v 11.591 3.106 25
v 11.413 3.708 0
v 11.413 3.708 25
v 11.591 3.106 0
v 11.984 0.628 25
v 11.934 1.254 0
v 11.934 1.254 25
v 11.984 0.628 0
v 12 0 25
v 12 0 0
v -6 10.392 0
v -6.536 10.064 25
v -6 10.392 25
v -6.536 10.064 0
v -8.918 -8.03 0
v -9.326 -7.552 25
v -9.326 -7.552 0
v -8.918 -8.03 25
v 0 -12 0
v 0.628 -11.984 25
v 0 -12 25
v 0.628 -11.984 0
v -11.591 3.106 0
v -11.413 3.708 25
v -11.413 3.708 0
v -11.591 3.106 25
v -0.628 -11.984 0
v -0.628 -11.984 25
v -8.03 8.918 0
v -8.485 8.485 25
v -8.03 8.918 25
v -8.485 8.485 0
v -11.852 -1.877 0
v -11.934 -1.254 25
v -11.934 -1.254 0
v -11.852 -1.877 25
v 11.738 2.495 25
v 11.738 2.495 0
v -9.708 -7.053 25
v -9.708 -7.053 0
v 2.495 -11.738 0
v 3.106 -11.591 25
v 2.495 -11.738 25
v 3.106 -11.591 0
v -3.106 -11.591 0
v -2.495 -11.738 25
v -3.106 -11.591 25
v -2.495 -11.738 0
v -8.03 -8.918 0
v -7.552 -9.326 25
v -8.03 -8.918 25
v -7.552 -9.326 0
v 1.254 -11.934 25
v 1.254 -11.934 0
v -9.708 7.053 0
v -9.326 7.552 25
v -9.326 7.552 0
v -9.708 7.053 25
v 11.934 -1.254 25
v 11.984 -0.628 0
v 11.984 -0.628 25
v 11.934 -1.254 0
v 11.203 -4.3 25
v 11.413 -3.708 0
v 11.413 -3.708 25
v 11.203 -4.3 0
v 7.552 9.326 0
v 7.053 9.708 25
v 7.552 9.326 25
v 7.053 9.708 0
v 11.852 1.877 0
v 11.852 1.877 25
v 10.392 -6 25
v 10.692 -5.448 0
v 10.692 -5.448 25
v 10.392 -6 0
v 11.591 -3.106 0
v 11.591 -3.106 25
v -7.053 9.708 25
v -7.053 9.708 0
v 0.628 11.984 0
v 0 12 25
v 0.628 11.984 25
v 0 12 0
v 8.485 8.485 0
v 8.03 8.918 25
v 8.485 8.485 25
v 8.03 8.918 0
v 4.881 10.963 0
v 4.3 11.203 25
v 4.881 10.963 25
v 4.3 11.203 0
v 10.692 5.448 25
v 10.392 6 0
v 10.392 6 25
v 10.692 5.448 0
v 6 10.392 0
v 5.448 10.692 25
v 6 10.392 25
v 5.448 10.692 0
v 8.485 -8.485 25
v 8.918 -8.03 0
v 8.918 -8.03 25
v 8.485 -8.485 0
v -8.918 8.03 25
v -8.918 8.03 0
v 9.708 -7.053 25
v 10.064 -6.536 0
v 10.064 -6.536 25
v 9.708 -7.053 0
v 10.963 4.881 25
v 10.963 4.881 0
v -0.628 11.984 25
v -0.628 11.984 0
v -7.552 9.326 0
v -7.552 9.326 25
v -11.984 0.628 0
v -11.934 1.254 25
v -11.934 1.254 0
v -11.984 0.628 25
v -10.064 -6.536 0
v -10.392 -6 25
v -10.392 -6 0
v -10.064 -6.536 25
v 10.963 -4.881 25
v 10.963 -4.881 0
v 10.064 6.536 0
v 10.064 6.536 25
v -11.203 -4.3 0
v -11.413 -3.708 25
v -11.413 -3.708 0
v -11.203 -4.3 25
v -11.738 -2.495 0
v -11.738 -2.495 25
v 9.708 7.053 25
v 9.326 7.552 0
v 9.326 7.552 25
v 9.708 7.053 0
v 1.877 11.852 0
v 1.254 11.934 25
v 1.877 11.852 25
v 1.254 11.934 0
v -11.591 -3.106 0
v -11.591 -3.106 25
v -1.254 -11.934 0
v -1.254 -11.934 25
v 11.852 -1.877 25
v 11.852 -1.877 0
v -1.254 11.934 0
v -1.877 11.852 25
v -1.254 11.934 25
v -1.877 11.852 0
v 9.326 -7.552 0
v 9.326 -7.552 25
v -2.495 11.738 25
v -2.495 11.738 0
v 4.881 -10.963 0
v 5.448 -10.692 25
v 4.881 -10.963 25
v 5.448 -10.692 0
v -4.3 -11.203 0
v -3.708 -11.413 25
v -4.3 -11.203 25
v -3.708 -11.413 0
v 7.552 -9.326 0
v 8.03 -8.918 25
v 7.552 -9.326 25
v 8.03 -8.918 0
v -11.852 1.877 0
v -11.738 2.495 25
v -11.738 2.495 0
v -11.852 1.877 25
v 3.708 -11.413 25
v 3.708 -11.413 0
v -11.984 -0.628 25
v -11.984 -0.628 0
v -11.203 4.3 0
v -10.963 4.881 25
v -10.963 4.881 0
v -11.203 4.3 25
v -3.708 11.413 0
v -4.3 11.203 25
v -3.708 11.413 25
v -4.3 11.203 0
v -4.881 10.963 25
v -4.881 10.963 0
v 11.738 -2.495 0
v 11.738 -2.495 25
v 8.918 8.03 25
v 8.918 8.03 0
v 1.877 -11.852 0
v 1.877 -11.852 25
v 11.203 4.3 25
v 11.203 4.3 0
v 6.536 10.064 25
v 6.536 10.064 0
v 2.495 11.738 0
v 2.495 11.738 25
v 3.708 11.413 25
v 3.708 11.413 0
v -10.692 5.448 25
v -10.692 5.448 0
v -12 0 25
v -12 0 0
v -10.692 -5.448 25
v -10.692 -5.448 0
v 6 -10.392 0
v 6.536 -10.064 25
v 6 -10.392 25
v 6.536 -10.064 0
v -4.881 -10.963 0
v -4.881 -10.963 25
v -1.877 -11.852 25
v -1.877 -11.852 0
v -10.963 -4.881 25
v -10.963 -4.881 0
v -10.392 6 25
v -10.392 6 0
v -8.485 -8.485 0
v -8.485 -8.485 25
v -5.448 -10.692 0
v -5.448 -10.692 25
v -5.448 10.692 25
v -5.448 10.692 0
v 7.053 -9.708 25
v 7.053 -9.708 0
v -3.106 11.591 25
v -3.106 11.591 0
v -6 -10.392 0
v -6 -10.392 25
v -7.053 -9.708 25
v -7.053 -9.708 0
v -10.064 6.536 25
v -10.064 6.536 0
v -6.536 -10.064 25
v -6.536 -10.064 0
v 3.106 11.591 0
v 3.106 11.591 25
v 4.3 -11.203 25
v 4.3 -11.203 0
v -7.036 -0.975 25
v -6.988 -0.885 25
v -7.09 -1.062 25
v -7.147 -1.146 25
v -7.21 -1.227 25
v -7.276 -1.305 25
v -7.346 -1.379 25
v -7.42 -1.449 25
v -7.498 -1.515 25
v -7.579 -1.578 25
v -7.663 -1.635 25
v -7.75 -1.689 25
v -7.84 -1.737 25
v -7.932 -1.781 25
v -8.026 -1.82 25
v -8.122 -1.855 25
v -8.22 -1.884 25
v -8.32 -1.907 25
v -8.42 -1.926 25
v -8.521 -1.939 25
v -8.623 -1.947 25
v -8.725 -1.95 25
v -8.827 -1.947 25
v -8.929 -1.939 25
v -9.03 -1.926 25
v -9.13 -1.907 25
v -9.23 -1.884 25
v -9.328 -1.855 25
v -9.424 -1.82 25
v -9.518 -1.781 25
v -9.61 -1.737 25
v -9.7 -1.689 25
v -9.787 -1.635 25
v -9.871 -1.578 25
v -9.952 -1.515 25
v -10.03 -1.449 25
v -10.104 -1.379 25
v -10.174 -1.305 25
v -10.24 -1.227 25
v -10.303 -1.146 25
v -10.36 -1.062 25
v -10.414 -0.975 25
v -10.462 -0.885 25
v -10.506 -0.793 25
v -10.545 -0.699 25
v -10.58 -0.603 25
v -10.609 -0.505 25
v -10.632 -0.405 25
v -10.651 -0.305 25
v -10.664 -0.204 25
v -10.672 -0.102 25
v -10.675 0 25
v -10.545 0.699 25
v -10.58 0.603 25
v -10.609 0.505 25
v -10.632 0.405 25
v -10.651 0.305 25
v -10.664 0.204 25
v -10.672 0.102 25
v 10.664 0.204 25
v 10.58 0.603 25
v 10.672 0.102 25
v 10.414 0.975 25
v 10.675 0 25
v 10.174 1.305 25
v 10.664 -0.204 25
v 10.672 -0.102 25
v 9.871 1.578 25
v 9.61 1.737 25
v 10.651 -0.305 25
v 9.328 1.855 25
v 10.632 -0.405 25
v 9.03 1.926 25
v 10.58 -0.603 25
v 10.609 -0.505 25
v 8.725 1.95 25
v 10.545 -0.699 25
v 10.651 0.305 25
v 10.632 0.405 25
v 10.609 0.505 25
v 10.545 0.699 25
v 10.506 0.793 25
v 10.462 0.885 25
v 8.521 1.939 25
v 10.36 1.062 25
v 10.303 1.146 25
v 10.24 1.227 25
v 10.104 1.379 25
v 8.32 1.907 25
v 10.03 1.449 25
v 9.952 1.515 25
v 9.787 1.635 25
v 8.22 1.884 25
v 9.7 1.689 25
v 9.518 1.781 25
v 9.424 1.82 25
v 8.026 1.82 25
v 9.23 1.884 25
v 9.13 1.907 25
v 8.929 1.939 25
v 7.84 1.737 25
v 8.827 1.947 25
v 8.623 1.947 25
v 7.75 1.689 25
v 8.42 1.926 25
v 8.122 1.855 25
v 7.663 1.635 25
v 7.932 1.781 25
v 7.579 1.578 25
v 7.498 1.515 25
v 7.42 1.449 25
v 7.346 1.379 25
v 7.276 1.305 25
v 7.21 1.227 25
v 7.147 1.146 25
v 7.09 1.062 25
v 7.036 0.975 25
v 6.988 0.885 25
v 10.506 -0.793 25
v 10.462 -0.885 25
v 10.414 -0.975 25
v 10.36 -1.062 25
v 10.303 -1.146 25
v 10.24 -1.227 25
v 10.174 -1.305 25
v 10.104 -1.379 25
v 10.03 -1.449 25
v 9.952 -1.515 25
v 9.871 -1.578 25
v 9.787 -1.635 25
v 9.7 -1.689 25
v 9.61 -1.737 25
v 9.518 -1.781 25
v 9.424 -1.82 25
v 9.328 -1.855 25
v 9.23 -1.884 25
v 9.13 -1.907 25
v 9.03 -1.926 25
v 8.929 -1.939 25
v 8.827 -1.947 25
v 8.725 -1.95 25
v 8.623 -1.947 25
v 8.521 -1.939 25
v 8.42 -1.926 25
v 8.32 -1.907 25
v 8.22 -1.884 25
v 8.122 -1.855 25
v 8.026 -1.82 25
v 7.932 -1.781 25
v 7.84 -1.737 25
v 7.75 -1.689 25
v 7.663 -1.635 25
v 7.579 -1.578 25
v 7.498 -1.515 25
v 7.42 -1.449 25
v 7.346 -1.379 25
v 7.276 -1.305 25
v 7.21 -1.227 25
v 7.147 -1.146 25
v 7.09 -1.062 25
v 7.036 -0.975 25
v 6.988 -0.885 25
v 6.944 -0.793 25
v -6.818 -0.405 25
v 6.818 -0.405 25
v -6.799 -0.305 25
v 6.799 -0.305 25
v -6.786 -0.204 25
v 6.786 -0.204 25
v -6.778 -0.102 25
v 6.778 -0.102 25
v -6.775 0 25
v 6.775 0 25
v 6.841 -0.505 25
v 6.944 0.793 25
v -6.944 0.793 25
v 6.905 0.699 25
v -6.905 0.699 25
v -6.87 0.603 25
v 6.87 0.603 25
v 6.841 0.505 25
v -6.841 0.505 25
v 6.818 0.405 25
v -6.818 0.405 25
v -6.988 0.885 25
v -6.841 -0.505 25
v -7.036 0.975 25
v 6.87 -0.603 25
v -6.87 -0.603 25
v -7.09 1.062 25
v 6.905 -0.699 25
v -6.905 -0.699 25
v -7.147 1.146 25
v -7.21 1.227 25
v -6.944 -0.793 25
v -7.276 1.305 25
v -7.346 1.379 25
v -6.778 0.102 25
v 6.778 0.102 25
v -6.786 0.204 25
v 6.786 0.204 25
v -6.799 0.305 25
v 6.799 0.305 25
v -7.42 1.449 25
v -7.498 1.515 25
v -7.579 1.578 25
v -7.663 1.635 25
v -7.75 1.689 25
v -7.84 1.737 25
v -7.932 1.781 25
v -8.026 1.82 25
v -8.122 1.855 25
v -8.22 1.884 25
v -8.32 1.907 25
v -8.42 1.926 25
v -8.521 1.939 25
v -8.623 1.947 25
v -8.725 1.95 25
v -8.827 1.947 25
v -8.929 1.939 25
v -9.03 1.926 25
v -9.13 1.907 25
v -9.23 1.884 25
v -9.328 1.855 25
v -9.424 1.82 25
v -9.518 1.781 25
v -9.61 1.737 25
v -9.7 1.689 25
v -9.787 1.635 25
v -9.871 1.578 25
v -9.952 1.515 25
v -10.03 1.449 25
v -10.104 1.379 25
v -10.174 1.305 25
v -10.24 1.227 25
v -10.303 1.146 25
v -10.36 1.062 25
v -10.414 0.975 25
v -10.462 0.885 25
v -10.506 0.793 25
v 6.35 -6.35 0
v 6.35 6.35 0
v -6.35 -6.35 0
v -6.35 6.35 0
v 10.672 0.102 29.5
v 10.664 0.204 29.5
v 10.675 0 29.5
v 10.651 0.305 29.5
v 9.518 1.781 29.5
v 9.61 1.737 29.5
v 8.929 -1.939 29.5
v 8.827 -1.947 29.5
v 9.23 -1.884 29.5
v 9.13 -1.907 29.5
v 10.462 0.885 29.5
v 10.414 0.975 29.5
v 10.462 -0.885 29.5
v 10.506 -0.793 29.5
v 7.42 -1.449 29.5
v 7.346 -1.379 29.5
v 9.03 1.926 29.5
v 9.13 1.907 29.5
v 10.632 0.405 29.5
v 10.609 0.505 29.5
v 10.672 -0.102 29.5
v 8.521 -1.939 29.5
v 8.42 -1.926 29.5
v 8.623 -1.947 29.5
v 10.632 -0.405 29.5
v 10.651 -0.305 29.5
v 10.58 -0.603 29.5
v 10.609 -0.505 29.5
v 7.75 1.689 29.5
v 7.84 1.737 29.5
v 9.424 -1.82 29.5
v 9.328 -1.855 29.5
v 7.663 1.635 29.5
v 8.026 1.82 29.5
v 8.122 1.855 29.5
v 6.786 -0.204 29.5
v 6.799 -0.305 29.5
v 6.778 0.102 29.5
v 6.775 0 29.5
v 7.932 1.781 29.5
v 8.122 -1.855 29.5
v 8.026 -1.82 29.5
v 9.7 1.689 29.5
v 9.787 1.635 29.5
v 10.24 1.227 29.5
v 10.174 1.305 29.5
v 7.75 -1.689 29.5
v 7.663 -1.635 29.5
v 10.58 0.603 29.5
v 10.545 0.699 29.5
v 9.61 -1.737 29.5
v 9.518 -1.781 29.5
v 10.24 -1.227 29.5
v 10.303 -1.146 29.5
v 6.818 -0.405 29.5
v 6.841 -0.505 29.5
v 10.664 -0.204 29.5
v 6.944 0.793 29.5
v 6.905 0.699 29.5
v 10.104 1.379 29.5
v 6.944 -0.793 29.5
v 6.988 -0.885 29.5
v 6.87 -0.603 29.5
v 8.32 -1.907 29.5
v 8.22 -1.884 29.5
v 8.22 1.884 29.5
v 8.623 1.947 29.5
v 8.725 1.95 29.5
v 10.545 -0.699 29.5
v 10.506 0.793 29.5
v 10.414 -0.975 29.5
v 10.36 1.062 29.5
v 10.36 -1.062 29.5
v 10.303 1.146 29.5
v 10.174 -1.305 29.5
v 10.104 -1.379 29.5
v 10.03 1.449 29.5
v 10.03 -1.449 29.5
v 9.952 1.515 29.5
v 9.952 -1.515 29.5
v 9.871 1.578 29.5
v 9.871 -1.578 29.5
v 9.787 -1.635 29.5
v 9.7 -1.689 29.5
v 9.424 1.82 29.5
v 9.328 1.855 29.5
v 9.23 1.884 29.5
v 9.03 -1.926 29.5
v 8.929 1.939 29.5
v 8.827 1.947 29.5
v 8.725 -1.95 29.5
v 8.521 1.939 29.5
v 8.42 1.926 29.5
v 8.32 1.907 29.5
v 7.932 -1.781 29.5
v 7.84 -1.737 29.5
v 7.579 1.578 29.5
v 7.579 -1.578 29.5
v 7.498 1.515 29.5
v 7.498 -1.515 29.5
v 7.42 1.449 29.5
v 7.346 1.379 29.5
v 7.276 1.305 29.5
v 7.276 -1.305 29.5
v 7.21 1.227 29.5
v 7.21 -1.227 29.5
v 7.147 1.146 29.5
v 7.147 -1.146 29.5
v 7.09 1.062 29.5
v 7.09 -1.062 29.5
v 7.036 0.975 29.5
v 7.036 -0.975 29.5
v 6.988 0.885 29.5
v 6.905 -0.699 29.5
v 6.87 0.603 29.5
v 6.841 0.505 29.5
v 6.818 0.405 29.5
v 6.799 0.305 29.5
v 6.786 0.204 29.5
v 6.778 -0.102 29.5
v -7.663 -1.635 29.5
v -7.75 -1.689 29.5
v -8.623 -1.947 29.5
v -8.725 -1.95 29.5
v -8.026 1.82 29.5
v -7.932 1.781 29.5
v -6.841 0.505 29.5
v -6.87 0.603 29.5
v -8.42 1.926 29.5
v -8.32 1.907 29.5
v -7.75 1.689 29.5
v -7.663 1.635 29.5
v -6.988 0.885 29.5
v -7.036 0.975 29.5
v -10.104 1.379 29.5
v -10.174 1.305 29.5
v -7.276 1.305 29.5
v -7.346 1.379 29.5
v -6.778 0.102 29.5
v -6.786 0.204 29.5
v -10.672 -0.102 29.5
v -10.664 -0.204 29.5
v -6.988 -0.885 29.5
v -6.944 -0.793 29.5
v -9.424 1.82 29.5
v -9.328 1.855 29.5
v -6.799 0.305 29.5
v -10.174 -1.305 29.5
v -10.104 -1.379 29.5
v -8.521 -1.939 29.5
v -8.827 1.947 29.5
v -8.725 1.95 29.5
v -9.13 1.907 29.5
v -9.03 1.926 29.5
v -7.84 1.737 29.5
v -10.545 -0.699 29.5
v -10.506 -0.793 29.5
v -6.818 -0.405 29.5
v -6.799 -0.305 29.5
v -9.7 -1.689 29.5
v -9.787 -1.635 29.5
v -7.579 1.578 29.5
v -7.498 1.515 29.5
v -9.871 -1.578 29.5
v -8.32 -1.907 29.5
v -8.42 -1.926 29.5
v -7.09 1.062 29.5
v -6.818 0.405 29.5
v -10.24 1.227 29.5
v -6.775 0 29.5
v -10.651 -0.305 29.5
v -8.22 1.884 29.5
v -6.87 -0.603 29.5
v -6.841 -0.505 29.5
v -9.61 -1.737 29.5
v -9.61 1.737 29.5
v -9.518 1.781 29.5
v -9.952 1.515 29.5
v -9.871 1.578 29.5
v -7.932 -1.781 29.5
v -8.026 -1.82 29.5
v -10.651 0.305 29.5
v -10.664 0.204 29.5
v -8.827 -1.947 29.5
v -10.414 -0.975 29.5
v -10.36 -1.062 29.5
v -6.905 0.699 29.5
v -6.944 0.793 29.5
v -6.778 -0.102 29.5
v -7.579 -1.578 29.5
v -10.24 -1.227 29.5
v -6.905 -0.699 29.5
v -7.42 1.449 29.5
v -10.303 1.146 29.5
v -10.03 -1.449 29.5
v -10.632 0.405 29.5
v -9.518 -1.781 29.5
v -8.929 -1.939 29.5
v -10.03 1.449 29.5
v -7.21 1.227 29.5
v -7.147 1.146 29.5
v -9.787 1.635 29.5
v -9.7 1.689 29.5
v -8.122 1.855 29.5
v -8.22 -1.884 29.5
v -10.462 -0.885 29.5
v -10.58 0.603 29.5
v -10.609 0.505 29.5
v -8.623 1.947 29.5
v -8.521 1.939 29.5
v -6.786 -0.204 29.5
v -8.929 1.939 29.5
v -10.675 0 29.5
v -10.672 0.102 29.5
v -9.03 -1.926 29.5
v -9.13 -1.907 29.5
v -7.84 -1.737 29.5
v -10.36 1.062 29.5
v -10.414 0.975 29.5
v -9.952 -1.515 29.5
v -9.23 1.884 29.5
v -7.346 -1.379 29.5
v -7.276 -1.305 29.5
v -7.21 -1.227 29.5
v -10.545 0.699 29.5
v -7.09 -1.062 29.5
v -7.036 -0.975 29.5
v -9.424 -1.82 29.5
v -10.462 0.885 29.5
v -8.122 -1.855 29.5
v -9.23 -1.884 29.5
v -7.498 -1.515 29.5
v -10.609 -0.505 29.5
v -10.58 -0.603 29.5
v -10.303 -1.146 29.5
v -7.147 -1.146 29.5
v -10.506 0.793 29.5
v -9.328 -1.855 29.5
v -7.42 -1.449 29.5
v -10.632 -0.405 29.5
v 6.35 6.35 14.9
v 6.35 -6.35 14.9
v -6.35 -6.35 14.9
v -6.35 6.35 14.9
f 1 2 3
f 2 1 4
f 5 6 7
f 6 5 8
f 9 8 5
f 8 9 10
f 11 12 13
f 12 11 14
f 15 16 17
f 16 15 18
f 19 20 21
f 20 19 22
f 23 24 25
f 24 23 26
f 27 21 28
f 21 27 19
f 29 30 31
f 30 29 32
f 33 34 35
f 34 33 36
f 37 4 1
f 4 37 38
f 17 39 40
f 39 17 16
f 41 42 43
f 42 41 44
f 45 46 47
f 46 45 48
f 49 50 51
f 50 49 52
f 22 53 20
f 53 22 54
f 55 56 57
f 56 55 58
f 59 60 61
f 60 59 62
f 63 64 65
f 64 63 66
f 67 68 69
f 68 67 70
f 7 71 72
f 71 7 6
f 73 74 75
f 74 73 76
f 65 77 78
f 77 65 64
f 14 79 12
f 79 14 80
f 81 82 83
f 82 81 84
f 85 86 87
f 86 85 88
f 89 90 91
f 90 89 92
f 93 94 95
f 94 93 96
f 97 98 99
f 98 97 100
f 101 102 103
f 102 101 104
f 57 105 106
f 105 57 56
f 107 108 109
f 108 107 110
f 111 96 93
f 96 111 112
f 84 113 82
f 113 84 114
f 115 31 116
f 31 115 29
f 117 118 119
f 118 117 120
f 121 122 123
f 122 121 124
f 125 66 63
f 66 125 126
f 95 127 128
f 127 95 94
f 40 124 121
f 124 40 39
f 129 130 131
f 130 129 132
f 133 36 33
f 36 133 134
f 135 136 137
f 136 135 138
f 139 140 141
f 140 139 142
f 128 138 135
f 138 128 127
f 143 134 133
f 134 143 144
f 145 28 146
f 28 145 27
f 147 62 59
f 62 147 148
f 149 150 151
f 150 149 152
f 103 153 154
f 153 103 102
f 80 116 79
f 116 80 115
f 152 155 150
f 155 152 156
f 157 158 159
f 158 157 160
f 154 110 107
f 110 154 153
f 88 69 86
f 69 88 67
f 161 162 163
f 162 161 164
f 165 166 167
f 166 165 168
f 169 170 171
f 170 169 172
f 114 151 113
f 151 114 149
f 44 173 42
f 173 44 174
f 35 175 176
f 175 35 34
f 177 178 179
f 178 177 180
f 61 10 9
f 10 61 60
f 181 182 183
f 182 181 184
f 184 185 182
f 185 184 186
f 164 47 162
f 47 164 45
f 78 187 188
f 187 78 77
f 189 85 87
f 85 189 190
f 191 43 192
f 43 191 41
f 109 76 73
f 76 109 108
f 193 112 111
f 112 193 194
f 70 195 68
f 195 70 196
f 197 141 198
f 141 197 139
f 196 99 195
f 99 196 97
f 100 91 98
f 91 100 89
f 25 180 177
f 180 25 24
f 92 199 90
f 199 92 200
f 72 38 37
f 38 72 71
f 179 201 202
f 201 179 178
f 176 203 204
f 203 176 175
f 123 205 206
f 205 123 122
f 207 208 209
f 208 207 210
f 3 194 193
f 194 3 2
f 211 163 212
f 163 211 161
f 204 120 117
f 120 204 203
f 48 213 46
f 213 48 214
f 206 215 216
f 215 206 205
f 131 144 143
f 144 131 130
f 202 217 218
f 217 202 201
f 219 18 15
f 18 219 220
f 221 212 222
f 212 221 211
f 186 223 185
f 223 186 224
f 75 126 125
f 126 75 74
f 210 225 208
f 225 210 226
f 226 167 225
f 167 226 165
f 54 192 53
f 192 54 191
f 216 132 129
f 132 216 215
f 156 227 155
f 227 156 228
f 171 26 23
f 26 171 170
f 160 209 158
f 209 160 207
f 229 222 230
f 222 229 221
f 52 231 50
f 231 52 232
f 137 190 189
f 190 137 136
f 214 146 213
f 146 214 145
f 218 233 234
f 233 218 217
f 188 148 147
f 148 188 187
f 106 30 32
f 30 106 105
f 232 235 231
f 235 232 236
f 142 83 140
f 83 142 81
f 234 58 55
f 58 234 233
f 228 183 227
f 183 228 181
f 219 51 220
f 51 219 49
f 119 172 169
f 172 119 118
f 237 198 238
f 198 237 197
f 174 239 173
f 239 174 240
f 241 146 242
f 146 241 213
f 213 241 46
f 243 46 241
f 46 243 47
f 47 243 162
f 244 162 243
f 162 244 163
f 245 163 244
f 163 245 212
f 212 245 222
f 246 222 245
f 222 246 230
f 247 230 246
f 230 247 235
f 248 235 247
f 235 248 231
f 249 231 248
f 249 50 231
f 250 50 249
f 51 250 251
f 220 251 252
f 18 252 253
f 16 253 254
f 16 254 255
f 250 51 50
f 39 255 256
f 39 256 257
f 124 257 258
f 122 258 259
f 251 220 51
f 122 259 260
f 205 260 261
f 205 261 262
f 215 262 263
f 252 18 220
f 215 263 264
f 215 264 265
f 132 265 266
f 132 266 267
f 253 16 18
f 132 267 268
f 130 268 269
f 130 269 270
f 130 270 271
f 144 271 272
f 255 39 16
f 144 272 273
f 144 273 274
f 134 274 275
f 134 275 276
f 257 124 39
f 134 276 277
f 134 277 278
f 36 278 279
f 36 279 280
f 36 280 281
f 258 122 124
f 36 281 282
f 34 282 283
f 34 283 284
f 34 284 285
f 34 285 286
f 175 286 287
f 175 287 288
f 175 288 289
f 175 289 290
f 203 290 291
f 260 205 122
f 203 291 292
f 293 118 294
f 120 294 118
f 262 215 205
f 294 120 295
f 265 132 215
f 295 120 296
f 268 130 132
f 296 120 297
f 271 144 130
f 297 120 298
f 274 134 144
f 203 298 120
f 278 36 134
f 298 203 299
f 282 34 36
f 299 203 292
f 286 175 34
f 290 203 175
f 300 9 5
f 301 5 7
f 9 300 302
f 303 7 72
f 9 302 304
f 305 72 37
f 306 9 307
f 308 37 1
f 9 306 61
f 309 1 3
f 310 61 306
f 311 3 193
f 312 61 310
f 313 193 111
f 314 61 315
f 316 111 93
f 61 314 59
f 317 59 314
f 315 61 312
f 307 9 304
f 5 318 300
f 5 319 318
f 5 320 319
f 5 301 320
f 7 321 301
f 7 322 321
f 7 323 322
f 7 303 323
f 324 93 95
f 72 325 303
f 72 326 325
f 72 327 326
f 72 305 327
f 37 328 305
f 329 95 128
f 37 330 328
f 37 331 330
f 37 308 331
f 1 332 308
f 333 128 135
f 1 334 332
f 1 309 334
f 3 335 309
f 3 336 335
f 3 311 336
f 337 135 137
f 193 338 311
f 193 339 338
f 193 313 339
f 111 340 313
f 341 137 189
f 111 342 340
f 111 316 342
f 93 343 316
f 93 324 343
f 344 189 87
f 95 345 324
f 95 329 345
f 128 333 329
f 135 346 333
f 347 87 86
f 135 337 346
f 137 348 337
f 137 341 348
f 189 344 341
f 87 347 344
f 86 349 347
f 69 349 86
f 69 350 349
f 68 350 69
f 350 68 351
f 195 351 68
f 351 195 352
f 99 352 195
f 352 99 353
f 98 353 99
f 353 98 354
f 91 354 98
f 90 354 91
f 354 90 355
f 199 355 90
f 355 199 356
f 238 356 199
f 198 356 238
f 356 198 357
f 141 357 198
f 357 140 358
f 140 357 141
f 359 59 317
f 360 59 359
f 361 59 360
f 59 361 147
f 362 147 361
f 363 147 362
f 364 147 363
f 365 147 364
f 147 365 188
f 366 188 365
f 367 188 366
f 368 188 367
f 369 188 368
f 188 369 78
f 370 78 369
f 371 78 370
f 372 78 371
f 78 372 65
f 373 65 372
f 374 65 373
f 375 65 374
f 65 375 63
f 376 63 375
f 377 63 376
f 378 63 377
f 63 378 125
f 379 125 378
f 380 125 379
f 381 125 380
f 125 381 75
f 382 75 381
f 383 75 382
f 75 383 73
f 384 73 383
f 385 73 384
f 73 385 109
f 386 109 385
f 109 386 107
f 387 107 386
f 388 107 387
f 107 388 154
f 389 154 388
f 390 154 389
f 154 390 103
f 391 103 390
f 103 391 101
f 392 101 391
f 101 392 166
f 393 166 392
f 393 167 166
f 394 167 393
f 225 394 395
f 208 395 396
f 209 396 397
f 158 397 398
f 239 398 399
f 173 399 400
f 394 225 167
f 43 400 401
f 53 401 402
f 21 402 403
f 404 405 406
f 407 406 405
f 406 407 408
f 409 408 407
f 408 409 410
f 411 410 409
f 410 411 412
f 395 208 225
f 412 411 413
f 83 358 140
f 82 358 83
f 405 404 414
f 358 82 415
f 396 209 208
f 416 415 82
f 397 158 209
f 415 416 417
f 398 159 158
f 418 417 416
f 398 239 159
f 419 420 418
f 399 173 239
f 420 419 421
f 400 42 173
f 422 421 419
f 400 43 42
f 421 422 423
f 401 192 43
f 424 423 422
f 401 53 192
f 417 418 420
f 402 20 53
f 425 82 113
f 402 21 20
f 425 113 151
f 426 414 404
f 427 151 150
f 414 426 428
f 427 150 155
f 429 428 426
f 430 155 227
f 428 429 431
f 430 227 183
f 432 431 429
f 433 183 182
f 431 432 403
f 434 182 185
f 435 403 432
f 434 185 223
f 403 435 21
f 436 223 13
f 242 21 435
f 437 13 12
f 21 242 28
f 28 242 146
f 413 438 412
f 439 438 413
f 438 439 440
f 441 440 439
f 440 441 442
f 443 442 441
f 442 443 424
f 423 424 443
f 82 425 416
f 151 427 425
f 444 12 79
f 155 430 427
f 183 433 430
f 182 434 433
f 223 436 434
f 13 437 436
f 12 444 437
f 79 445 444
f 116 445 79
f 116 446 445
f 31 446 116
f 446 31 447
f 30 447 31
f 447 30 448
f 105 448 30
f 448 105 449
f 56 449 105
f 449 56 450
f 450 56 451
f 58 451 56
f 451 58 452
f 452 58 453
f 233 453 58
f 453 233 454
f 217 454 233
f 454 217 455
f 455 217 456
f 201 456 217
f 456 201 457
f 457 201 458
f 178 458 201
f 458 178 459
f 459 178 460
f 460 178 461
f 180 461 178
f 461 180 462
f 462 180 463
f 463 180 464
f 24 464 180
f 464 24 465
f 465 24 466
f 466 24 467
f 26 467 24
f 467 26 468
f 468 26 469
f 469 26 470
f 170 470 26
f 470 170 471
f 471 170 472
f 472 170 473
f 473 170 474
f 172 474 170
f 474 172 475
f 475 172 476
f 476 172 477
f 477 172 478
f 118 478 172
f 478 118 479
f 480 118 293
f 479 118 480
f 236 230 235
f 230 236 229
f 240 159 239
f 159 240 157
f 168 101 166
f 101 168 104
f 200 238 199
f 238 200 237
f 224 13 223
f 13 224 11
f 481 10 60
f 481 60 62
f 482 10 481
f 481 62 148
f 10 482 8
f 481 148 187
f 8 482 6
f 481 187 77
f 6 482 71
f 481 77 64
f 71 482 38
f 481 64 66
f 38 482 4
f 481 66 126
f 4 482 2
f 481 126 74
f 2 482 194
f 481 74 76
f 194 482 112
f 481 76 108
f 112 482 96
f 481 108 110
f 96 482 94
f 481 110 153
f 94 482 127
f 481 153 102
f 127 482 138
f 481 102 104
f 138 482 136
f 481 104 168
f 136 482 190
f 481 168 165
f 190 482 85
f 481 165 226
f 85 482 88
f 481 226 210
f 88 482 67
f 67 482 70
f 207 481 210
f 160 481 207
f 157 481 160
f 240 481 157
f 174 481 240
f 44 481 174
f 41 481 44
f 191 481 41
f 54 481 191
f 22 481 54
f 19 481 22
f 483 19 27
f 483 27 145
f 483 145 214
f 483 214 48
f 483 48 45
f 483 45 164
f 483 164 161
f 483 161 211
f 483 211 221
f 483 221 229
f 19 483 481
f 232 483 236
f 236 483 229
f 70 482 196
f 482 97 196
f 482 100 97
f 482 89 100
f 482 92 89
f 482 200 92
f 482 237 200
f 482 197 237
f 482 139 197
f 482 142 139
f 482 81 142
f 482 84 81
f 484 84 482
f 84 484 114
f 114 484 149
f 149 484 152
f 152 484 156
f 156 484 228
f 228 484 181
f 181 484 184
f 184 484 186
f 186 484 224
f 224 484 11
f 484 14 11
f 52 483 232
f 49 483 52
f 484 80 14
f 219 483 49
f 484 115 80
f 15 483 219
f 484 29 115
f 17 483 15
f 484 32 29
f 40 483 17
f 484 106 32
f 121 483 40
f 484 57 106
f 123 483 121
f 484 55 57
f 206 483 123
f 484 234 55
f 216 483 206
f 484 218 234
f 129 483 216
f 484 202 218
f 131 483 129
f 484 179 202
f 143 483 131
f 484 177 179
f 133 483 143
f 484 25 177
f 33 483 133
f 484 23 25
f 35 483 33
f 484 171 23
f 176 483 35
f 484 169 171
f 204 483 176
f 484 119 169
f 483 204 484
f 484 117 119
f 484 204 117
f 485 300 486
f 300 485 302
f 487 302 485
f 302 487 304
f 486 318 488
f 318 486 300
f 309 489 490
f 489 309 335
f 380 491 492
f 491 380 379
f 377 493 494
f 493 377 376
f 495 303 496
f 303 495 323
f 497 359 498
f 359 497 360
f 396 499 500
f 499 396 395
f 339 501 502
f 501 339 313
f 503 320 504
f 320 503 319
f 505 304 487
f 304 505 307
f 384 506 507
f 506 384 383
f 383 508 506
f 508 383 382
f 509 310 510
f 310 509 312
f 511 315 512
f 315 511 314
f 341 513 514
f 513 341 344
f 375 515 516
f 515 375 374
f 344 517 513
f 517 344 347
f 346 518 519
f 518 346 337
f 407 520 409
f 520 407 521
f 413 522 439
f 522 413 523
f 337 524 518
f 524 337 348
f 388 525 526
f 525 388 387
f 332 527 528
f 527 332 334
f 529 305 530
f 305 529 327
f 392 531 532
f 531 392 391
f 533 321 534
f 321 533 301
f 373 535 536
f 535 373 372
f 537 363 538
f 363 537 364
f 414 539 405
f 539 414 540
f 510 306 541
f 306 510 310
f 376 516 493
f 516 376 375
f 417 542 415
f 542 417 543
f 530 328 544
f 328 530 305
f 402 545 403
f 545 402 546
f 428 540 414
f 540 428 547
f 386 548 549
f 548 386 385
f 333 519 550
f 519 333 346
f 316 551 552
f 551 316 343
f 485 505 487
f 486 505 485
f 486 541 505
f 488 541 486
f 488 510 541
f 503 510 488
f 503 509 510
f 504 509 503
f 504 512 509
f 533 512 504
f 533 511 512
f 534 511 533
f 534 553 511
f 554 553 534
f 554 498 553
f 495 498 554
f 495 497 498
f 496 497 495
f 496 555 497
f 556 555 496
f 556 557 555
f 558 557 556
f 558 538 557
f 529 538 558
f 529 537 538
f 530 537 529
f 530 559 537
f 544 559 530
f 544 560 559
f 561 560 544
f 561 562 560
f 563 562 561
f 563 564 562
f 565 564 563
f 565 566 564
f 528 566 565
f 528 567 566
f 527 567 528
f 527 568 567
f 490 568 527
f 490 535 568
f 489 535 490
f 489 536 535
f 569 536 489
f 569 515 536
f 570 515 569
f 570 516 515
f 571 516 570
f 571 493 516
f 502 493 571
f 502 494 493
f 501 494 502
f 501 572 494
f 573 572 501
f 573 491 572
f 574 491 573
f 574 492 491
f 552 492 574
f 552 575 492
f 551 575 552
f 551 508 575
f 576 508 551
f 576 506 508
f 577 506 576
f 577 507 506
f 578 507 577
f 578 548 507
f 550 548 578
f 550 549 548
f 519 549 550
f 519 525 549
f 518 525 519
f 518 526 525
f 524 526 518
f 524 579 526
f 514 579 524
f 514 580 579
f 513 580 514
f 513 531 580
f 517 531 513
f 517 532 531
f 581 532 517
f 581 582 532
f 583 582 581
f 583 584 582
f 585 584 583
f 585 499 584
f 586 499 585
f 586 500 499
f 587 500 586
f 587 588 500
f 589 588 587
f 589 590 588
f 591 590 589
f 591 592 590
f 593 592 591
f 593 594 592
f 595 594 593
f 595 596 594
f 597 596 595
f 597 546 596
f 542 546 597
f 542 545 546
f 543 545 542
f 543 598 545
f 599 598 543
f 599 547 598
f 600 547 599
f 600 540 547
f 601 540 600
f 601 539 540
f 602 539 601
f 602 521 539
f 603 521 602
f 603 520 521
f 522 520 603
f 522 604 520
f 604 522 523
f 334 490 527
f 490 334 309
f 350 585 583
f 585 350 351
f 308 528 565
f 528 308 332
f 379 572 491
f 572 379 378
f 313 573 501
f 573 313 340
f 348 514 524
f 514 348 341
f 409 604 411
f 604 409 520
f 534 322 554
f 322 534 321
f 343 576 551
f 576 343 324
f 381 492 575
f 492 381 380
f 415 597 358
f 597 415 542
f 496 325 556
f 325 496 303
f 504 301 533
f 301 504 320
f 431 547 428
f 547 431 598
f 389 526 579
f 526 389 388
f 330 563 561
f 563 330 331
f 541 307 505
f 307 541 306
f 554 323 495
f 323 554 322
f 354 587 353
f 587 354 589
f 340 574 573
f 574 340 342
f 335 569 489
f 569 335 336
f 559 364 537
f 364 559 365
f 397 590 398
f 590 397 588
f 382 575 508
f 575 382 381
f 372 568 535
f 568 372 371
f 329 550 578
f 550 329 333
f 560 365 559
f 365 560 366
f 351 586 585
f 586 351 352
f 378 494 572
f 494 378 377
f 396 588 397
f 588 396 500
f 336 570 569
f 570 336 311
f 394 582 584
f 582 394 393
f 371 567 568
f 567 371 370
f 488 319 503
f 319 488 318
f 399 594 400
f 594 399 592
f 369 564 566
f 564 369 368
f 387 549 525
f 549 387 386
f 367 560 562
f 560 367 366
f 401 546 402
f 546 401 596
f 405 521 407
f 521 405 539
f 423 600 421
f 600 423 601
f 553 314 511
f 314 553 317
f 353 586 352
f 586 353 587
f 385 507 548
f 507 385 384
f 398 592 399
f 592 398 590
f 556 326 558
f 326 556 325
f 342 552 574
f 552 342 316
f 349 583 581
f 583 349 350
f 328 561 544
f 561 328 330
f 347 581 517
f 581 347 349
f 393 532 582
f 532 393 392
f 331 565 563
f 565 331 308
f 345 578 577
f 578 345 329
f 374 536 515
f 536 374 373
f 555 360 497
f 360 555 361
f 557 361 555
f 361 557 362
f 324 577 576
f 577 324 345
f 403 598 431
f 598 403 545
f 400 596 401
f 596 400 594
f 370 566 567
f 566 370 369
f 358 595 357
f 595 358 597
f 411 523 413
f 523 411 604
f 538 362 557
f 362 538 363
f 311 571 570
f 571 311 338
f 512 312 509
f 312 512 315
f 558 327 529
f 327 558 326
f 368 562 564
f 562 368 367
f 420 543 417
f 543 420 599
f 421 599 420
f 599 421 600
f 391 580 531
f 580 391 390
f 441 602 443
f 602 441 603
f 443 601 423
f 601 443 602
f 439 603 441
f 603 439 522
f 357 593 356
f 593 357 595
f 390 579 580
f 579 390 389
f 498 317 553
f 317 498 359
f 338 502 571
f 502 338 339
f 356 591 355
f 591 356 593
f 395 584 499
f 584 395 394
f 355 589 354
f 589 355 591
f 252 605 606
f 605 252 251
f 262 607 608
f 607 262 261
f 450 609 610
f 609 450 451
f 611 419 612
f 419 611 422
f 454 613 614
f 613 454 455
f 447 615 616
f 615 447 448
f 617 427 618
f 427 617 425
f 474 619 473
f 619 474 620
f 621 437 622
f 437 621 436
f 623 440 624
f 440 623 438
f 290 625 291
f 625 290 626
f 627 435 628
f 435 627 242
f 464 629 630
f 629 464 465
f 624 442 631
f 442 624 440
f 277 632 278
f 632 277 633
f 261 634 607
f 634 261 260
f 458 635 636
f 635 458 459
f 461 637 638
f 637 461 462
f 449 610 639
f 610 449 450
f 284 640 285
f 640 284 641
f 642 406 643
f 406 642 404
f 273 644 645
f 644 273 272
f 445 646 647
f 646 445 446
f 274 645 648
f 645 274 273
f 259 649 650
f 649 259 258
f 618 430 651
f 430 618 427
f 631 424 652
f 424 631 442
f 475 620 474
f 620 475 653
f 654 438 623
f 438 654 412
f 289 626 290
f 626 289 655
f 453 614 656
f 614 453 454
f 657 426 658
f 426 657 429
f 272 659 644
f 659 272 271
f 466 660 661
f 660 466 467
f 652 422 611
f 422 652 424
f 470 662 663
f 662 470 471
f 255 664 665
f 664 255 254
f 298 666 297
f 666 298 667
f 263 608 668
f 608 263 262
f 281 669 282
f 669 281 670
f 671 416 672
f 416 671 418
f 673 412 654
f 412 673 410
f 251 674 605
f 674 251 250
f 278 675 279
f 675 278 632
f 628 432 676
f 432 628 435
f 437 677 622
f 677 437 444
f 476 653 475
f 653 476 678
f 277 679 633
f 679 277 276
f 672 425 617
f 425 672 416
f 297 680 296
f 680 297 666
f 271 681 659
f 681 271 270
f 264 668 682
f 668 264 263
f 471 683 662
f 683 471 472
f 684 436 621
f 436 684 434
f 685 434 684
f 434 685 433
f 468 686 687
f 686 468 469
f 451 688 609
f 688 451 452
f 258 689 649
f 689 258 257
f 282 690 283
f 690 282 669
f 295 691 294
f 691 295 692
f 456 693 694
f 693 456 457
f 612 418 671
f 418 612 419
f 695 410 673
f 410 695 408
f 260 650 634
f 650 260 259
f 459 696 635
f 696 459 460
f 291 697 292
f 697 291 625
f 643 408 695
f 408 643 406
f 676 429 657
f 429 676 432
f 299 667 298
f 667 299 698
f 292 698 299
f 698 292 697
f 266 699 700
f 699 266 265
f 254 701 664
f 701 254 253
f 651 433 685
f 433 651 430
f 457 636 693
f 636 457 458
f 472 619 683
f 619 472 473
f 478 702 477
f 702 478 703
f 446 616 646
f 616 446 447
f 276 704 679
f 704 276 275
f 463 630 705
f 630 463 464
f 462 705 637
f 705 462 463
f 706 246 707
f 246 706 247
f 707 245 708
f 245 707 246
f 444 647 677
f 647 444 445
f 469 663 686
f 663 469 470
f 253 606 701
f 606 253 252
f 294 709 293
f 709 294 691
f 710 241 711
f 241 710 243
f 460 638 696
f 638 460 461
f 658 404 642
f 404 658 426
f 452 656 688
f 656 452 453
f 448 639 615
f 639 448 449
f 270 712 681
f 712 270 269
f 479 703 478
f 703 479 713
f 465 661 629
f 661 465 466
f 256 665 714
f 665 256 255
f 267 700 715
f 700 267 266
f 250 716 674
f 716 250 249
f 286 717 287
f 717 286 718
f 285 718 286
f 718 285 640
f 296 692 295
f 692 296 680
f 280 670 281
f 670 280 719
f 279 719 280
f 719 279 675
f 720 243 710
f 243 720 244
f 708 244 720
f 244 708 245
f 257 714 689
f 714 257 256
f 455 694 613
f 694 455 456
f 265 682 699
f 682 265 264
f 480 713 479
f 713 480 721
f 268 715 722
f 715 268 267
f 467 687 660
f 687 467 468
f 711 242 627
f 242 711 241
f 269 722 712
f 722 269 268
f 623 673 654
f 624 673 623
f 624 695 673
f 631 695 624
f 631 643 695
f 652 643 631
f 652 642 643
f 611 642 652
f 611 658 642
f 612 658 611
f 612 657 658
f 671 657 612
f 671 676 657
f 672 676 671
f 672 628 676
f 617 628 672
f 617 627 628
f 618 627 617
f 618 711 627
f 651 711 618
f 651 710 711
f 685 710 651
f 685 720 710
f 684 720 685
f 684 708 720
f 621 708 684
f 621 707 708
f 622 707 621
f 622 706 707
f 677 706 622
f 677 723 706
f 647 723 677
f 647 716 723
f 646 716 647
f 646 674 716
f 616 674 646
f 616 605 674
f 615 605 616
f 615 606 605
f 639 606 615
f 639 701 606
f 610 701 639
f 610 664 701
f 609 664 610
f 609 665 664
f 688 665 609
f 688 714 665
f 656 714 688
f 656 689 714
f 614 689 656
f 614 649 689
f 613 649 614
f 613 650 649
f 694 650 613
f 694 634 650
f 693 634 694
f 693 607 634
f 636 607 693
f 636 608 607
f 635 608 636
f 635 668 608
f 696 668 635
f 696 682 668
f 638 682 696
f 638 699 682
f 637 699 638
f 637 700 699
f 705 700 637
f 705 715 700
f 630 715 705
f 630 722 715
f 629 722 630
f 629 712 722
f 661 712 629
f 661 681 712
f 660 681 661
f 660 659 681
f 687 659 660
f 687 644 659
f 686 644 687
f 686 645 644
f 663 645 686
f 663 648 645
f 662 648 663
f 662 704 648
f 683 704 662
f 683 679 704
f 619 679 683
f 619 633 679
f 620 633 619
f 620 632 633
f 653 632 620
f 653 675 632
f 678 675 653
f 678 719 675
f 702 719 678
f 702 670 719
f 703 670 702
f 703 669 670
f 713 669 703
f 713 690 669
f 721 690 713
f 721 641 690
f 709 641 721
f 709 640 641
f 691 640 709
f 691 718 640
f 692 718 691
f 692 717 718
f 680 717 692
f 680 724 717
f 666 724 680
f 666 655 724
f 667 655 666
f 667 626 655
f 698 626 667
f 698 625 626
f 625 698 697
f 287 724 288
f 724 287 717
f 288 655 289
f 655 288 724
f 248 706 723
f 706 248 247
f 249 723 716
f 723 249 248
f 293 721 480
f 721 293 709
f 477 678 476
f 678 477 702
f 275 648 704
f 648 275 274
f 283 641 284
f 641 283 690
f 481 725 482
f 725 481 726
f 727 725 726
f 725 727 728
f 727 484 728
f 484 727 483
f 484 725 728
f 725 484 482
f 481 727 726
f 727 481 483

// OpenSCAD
// =================================================================
// FLAT-FACED COUNTERSUNK SPANNER WRENCH BIT
// Designed to clear recessed pockets in manhole covers
// =================================================================

$fn = 120;

// Dimensions matching the countersunk 5/8" bolt configuration
tool_outer_dia   = 24.0;  // Must be smaller than the manhole pocket diameter
tool_body_height = 25.0;  // Main body height
drive_square_dia = 12.7;  // Standard 1/2" socket drive cutout

pin_diameter     = 3.90;  // Scaled for the countersunk hole size (with 0.05mm clearance)
pin_distance     = 17.45; // Exact center-to-center matching distance
pin_length       = 4.5;   // Length corresponding to the shorter countersunk head depth

generate_flat_spanner_tool();

module generate_flat_spanner_tool() {
    difference() {
        union() {
            // Perfectly flat cylindrical face to make flush contact with the bolt
            cylinder(d=tool_outer_dia, h=tool_body_height);
            
            // Heavy-duty straight pins protruding from the flat face
            translate([pin_distance / 2, 0, tool_body_height])
                cylinder(d=pin_diameter, h=pin_length);
                
            translate([-pin_distance / 2, 0, tool_body_height])
                cylinder(d=pin_diameter, h=pin_length);
        }
        
        // 1/2" Square drive receptacle for standard field ratchets or breaker bars
        translate([-drive_square_dia/2, -drive_square_dia/2, -0.1])
            cube([drive_square_dia, drive_square_dia, 15]);
    }
}
